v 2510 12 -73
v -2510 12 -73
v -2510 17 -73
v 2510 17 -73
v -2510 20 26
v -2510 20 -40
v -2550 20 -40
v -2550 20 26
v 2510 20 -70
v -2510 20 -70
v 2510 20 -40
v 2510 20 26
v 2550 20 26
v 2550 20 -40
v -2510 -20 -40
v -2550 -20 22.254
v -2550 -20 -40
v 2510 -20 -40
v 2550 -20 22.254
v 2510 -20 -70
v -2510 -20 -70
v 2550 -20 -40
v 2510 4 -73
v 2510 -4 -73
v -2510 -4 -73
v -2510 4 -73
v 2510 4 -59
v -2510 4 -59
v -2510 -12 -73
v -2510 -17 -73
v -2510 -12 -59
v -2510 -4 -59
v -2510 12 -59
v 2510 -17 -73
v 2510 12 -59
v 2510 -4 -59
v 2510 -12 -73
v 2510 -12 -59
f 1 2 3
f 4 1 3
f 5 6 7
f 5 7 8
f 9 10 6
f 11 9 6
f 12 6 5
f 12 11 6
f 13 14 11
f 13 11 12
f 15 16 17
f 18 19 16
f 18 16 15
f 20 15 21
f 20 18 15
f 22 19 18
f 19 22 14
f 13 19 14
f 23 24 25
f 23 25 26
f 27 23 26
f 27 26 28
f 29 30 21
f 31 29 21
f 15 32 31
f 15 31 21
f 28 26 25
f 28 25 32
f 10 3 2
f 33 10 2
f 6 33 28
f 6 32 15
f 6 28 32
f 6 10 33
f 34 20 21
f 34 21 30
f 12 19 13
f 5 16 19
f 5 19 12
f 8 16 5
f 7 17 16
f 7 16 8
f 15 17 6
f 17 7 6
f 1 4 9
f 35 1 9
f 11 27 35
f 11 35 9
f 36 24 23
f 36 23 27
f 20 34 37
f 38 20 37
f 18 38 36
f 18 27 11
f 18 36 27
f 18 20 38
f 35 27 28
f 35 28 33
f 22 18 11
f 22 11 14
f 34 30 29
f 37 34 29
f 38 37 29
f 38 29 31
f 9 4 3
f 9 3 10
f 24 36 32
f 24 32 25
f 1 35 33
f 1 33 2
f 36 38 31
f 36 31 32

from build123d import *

# Parameters (mm, degrees)
F1_DEPTH      = 2550
F2_W          = 80
F2_H          = 66
F3_DEPTH      = 50
F6_DEPTH      = 2550.001
F6_DEPTH_BACK = 2550.001


with BuildPart() as f1:
    # F0 (on Right) → F1 (new body, symmetric)
    with BuildSketch(Plane.YZ):
        Polygon((20, -70), (20, 56), (17, 59), (12, 59), (12, 73), (4, 73), (4, 59), (-4, 59), (-4, 73), (-12, 73), (-12, 59), (-17, 59), (-20, 56), (-20, -70), (-17, -73), (-12, -73), (-12, -59), (-4, -59), (-4, -73), (4, -73), (4, -59), (12, -59), (12, -73), (17, -73), align=None)
    extrude(amount=F1_DEPTH, both=True)

    # F2 (on Front) → F3 (cut, symmetric)
    with BuildSketch(Plane.XZ):
        with Locations((-2550, 59)):
            Rectangle(F2_W, F2_H)
        with Locations((-2550, -73)):
            Rectangle(F2_W, F2_H)
        with Locations((2550, 59)):
            Rectangle(F2_W, F2_H)
        with Locations((2550, -73)):
            Rectangle(F2_W, F2_H)
    extrude(amount=F3_DEPTH, both=True, mode=Mode.SUBTRACT)

    # F5 (on Right) → F6 (cut, two sides)
    with BuildSketch(Plane.YZ) as f6_sk:
        Polygon((-30, 83), (-30, 21.317628), (30, 26.936474), (30, 83), align=None)
    extrude(amount=F6_DEPTH, mode=Mode.SUBTRACT)
    extrude(f6_sk.sketch, amount=-F6_DEPTH_BACK, mode=Mode.SUBTRACT)


solid = f1.part
